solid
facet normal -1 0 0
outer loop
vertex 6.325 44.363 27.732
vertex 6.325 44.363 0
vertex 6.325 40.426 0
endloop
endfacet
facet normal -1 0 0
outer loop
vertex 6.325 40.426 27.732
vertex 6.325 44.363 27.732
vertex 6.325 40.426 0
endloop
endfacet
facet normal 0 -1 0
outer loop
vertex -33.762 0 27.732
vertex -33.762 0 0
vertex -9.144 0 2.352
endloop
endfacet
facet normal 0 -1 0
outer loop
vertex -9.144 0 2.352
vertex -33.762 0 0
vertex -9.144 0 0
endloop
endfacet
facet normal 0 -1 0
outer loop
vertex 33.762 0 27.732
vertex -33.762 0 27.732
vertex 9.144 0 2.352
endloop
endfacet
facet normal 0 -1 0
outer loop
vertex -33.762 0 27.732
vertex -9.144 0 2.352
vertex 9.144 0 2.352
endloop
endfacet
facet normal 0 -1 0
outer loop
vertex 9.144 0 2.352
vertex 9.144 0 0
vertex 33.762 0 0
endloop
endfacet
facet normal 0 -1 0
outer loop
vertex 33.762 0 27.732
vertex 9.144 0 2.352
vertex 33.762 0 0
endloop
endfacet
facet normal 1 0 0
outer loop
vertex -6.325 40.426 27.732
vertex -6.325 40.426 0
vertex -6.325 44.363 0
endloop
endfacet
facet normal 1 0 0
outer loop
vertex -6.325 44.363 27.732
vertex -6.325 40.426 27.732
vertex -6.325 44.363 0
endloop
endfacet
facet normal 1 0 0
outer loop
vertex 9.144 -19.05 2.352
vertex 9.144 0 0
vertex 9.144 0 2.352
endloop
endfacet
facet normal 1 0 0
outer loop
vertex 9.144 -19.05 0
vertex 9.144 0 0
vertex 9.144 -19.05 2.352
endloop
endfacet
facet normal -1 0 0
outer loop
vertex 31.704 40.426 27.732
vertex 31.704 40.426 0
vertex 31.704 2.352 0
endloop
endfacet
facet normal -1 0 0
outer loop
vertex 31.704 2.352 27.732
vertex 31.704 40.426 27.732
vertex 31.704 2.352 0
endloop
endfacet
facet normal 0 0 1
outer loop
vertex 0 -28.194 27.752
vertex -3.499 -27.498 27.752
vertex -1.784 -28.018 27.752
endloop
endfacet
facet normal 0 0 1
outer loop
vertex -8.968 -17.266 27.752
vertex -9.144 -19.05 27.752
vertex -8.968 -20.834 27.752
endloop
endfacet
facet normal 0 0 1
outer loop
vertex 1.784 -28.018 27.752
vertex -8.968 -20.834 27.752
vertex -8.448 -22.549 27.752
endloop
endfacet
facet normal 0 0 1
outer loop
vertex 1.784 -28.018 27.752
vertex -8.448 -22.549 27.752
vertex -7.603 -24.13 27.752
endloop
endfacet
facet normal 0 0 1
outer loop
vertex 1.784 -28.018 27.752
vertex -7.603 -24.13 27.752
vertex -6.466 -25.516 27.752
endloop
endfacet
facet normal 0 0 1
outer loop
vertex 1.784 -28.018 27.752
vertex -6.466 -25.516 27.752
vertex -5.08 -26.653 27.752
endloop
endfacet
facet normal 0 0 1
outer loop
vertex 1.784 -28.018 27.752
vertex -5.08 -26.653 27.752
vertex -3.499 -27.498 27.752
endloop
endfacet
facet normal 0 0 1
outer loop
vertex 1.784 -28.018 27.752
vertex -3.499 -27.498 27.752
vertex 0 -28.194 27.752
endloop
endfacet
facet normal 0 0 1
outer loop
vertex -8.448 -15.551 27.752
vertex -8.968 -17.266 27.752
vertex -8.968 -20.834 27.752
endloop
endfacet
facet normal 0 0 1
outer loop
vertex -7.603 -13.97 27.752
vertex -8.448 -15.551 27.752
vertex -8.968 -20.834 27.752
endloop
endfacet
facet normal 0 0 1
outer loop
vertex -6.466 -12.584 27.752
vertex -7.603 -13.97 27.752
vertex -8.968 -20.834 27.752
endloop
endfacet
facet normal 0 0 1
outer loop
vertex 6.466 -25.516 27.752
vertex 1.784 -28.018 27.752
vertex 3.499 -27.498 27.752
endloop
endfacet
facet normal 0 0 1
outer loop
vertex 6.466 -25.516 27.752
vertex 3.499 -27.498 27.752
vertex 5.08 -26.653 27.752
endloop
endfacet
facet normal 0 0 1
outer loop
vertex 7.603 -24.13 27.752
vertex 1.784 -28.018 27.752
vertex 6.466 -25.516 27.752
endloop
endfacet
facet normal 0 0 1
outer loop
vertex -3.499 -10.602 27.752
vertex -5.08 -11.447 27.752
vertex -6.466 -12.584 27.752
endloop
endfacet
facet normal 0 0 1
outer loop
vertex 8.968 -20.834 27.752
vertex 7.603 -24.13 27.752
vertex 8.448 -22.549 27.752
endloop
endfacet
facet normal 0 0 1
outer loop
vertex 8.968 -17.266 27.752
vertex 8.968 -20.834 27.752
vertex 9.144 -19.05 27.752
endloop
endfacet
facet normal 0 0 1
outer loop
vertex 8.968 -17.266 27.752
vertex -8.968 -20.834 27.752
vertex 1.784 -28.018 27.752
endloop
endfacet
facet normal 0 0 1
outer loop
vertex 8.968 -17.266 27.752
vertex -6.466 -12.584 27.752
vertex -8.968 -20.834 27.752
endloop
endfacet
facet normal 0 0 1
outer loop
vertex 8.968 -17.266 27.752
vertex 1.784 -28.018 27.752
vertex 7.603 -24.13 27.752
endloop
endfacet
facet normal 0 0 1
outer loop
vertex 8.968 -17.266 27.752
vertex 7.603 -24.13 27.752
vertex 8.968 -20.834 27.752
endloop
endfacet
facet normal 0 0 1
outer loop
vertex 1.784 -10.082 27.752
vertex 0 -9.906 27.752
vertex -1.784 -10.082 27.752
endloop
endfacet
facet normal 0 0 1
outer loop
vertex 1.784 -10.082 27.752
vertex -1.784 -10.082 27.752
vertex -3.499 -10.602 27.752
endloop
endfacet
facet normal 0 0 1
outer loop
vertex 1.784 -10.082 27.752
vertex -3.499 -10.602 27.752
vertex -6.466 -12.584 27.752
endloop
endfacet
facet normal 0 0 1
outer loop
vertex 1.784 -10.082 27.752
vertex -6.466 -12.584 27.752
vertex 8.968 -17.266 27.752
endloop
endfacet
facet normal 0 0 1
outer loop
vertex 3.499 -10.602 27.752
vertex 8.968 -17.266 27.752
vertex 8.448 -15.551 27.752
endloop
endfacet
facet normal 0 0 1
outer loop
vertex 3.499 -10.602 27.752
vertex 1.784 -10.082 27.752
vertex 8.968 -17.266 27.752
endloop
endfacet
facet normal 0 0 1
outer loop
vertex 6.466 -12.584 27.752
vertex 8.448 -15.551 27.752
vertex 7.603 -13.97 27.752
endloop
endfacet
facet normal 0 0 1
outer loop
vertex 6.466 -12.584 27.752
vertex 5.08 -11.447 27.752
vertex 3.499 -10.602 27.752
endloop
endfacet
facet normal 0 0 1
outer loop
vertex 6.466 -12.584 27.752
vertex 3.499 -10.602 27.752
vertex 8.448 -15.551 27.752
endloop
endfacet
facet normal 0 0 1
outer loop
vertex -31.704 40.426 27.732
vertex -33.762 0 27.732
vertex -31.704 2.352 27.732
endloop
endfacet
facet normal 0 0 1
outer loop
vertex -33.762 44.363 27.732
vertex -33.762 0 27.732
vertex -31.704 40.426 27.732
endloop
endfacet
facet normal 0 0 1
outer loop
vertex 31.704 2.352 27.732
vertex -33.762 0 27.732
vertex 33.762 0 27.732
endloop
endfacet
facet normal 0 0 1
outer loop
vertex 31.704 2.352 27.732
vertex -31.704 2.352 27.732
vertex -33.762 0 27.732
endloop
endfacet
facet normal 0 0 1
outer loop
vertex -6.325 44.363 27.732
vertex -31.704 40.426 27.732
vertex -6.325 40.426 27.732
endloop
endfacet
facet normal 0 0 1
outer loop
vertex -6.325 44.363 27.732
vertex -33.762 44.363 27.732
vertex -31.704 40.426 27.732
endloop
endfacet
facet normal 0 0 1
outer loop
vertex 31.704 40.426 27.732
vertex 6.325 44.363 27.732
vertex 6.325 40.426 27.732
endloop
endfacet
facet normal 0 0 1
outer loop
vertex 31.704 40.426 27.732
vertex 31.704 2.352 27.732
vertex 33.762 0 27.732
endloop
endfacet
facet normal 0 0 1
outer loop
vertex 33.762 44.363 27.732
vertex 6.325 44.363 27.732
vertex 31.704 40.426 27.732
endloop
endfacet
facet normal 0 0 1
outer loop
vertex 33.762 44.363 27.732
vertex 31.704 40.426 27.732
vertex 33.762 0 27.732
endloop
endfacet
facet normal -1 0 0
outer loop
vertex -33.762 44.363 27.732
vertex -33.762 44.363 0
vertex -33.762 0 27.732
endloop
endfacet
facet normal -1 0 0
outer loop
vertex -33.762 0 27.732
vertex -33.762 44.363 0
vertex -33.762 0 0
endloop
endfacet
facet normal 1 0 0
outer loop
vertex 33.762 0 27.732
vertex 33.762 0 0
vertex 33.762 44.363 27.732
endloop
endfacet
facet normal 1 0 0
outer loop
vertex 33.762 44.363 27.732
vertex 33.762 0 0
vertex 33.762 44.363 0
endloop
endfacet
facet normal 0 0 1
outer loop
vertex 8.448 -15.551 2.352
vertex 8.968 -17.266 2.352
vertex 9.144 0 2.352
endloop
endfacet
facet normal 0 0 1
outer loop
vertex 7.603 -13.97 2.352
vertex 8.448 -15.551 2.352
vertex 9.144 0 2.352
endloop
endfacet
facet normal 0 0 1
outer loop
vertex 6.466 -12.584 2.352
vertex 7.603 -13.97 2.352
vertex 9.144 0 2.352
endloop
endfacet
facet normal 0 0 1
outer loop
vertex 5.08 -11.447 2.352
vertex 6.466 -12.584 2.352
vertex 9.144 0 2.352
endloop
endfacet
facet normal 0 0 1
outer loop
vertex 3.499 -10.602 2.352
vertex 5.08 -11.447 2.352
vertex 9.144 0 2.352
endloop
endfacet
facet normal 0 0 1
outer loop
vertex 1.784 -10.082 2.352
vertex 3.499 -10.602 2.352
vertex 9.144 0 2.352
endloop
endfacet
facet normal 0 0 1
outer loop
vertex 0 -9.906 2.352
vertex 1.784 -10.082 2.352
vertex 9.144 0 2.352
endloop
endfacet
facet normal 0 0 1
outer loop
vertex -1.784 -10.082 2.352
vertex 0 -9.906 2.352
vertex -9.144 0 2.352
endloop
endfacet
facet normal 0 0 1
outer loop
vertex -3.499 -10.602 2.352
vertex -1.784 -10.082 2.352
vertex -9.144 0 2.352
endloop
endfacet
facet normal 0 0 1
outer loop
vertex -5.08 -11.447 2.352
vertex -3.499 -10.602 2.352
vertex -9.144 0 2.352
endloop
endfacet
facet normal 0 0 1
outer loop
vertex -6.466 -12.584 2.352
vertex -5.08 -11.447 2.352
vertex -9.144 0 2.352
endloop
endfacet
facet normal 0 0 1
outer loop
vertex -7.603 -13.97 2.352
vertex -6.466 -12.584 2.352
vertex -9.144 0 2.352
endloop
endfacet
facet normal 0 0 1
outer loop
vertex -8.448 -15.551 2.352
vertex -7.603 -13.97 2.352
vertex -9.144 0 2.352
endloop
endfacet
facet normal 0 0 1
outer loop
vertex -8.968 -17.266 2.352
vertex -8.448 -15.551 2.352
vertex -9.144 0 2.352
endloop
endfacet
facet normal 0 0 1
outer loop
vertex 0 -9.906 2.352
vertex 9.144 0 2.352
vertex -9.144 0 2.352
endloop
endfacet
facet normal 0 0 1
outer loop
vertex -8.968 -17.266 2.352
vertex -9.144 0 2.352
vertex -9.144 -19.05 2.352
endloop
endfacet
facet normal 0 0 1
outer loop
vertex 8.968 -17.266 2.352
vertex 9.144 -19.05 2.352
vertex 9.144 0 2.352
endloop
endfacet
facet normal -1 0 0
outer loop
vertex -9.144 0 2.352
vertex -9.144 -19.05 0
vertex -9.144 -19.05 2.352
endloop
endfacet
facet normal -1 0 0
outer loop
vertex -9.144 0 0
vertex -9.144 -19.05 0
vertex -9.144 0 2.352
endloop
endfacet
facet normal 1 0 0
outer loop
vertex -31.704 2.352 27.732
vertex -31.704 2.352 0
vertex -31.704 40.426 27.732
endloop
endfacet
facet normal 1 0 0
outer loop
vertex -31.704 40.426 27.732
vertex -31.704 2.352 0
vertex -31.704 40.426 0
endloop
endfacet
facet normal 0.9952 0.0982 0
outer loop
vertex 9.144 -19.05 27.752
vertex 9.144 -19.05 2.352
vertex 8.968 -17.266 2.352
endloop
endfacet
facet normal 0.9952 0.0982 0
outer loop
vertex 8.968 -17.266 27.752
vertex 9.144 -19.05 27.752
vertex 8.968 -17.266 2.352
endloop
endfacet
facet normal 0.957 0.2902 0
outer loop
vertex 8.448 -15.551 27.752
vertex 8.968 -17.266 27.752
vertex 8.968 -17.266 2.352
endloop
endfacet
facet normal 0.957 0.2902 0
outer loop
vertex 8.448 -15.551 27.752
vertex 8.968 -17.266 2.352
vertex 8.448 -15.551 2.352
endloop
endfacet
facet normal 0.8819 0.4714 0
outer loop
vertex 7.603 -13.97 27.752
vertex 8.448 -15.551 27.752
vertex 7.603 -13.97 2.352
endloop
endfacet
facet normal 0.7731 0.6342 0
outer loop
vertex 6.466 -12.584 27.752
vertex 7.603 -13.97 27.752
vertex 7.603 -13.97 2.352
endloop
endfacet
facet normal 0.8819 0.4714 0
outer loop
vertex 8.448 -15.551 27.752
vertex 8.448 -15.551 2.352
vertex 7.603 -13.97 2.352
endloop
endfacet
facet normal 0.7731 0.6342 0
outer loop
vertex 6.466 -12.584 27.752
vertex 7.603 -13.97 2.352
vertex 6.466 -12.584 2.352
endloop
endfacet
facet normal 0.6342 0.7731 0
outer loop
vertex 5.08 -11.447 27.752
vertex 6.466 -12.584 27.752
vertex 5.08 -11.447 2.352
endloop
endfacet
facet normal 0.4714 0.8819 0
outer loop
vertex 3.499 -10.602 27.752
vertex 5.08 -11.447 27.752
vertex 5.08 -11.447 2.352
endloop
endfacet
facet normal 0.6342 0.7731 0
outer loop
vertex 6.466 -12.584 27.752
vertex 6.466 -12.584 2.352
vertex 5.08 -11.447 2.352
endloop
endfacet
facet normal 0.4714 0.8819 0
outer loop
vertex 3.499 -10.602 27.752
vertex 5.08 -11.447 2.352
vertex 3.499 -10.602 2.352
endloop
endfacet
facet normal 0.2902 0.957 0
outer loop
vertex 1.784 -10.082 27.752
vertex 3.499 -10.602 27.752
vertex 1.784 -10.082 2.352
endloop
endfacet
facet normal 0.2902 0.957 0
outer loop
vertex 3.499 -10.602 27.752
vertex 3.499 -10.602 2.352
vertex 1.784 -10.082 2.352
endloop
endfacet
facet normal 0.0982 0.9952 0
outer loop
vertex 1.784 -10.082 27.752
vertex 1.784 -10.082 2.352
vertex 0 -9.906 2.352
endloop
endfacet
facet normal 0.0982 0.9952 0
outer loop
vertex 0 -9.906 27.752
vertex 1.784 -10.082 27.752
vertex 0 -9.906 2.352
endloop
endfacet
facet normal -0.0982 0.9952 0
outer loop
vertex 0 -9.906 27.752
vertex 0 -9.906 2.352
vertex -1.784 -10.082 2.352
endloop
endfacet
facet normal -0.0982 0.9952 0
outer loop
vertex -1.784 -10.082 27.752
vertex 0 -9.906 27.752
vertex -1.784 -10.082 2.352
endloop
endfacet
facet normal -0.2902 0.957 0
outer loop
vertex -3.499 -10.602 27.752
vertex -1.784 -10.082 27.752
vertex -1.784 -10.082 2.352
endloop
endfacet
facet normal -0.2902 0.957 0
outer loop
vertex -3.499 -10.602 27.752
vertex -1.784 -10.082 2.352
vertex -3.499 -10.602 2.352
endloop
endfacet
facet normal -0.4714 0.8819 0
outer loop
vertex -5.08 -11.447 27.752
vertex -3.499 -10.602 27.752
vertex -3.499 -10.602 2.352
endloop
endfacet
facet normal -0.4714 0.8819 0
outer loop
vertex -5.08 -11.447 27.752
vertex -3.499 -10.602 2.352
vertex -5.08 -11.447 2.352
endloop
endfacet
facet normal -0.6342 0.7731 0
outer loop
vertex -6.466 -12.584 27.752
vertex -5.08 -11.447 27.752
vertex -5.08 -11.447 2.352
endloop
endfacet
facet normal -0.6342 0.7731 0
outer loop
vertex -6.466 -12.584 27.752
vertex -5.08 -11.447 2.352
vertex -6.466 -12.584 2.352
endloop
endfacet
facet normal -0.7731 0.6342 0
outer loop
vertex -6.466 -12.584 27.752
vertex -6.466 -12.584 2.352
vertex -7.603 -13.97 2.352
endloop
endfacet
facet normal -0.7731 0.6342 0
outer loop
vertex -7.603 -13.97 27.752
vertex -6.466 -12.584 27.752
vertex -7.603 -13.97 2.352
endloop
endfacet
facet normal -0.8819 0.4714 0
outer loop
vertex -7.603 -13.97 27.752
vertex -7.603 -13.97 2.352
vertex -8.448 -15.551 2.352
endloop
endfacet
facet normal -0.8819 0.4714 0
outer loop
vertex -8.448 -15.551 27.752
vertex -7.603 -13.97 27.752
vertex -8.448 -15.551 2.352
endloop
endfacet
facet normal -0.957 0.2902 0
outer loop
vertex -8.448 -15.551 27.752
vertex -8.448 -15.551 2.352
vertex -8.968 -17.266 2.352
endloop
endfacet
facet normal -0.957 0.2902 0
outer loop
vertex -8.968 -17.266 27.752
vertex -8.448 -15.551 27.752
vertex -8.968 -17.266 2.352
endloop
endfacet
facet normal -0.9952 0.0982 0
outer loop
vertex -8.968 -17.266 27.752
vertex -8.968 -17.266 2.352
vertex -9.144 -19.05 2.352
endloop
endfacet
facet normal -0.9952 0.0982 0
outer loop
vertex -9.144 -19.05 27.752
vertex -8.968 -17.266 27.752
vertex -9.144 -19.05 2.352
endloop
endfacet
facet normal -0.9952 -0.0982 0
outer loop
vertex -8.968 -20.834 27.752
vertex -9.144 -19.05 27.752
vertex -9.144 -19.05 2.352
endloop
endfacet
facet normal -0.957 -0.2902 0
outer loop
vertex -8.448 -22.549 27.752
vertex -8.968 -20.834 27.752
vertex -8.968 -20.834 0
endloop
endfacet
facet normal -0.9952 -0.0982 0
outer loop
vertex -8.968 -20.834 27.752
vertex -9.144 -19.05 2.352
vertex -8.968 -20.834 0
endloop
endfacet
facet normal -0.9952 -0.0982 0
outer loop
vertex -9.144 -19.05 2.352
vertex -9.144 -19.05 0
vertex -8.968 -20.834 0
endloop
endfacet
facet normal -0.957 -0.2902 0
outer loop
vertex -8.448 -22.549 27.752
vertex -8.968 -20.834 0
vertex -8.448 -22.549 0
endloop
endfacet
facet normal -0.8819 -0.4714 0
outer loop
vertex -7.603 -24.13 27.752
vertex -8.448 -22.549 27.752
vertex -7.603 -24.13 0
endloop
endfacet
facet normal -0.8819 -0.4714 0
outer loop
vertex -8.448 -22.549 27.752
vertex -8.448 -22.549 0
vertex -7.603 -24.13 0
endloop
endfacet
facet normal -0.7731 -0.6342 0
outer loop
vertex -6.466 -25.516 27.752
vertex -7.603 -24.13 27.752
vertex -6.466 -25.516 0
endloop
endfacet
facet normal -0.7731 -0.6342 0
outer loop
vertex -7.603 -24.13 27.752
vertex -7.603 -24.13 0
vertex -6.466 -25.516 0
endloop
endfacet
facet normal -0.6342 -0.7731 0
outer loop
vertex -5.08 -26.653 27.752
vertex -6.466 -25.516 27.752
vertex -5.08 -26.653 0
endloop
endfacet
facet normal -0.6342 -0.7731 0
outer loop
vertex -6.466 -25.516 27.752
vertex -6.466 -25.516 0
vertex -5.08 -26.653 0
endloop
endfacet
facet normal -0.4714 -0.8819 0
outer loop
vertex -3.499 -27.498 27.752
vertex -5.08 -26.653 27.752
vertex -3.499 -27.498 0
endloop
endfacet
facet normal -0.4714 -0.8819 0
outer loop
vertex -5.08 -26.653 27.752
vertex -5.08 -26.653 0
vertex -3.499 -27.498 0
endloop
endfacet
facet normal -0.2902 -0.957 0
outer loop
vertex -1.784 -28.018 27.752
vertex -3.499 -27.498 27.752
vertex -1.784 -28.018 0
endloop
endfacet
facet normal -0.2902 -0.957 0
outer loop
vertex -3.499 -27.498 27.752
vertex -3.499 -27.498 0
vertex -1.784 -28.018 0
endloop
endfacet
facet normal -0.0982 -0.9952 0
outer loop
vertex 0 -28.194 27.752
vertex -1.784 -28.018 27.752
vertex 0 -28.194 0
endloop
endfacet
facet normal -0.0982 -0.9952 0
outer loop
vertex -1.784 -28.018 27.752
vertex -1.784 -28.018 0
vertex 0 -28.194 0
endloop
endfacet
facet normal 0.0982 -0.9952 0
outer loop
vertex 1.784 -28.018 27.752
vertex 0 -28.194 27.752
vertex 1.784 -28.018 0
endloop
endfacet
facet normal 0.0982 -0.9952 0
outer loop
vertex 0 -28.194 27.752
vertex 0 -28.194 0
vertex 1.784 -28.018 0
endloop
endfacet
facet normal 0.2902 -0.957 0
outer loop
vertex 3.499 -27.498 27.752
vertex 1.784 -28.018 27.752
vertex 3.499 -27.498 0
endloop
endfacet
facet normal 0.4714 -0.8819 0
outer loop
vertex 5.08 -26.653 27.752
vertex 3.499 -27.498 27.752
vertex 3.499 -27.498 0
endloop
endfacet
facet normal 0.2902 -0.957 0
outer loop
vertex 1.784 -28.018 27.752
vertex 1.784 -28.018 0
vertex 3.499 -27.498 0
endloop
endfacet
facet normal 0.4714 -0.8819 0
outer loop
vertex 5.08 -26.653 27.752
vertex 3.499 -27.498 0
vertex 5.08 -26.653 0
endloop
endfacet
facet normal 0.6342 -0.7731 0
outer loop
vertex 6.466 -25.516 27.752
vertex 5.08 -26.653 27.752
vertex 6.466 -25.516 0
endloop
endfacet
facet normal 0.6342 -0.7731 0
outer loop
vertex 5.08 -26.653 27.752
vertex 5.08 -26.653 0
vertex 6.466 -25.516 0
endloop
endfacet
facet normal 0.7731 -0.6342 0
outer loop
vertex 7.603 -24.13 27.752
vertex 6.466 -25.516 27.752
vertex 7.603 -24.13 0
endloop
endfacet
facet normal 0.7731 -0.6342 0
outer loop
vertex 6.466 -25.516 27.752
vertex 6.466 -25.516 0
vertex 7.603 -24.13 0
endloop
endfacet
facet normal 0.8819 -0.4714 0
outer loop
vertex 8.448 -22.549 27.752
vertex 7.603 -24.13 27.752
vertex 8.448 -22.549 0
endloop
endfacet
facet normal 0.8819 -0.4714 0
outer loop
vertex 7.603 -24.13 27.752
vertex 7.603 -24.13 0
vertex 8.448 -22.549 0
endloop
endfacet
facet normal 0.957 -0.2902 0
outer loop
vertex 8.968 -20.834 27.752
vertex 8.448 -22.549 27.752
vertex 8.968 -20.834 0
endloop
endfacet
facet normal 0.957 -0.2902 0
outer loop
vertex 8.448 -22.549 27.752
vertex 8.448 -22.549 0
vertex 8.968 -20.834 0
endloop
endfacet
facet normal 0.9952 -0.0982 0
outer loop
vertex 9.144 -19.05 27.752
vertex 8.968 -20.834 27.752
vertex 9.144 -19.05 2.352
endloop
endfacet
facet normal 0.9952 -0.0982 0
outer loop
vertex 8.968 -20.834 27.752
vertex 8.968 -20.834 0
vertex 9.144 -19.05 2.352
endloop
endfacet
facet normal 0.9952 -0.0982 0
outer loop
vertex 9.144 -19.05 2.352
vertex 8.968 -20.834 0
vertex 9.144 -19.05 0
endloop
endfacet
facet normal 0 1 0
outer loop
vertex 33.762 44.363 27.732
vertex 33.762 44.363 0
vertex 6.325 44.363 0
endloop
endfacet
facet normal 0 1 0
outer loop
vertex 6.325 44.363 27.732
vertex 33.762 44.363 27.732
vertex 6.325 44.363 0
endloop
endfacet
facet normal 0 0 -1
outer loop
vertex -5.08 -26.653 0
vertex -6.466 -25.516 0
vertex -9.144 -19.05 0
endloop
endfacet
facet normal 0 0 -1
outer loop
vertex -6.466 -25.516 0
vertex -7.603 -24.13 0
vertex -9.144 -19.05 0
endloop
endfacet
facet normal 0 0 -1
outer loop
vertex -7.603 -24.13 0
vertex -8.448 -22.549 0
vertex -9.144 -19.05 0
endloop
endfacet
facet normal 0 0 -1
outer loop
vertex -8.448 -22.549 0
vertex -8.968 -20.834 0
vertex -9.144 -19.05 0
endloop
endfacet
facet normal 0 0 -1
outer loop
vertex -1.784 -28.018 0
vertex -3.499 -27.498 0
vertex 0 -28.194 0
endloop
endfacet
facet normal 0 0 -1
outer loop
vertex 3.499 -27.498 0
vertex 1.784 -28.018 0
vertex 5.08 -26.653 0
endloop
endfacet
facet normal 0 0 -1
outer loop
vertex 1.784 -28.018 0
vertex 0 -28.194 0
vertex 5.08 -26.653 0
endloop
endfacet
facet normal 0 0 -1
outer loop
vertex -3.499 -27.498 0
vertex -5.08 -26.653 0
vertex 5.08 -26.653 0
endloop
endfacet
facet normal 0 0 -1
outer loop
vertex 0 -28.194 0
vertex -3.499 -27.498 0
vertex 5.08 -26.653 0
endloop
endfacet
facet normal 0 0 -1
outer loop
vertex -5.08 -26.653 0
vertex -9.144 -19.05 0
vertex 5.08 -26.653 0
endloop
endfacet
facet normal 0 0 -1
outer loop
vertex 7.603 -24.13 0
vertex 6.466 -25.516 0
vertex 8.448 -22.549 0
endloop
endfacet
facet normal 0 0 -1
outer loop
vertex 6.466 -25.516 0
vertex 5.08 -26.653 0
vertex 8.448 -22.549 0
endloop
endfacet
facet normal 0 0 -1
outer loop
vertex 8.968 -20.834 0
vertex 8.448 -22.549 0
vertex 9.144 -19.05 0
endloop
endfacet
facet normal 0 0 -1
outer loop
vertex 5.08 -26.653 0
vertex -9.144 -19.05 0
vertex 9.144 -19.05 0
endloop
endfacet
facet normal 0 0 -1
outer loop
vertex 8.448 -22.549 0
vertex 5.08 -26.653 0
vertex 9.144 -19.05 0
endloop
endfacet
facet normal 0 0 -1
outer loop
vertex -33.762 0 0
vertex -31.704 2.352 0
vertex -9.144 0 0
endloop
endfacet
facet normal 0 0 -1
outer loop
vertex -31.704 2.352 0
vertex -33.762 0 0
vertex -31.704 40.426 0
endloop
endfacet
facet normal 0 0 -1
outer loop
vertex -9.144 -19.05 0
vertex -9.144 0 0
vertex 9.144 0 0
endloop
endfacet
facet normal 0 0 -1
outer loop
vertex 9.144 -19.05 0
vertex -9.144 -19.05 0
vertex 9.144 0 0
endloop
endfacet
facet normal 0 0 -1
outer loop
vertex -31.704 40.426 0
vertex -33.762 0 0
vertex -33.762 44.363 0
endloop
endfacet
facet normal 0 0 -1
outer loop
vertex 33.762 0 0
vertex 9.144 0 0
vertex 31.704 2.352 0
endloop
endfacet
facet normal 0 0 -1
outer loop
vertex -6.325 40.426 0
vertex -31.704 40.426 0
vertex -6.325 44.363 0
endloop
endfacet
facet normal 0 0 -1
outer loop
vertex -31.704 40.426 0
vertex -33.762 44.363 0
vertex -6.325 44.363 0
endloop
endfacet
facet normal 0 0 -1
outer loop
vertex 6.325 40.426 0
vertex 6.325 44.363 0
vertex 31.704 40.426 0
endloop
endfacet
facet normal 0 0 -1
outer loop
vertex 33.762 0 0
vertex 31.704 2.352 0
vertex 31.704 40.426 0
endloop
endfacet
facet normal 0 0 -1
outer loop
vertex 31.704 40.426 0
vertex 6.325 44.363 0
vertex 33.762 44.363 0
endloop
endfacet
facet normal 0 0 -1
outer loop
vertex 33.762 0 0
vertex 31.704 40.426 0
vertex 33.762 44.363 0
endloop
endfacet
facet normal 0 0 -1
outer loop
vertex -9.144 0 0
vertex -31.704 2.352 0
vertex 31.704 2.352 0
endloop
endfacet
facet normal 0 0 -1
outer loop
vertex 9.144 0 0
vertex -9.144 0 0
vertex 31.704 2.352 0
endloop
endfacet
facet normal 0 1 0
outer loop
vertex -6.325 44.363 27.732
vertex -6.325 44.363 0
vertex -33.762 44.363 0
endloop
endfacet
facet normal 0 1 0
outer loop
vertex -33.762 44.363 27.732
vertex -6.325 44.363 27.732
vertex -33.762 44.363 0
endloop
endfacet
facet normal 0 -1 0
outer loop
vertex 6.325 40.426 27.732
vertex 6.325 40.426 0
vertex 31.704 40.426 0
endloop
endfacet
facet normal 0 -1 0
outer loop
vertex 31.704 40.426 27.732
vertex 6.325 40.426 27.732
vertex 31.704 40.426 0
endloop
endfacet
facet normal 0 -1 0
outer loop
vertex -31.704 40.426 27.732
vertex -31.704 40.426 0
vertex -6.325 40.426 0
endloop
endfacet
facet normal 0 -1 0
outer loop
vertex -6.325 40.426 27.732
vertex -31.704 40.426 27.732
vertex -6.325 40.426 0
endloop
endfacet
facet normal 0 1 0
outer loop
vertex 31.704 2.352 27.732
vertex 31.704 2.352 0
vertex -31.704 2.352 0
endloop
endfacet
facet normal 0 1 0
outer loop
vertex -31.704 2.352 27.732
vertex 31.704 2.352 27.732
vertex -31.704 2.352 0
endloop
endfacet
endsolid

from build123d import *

# Parameters (mm, degrees)
BOSS_EXTRUDE1_DEPTH = 27.731531852
BOSS_EXTRUDE2_DEPTH = 2.351851852
SKETCH4_R           = 9.144
BOSS_EXTRUDE3_DEPTH = 25.4


with BuildPart() as part:
    # Sketch1 → Boss-Extrude1 (new body)
    with BuildSketch(Plane.XY):
        Polygon((-33.76168, 0), (33.76168, 0), (33.76168, 44.363451852), (6.3246, 44.363451852), (6.3246, 40.426451852), (31.70428, 40.426451852), (31.70428, 2.351851852), (-31.70428, 2.351851852), (-31.70428, 40.426451852), (-6.3246, 40.426451852), (-6.3246, 44.363451852), (-33.76168, 44.363451852), align=None)
    extrude(amount=BOSS_EXTRUDE1_DEPTH)

    # Sketch2 → Boss-Extrude2 (add)
    with BuildSketch(Plane.XY):
        with BuildLine():
            Line((-9.144, 0), (9.144, 0))
            Line((9.144, 0), (9.144, -19.05))
            ThreePointArc((9.144, -19.05), (0, -28.194), (-9.144, -19.05))
            Line((-9.144, -19.05), (-9.144, 0))
        make_face()
    extrude(amount=BOSS_EXTRUDE2_DEPTH)

    # Sketch4 → Boss-Extrude3 (add)
    with BuildSketch(Plane.XY.offset(2.351851852)):
        with Locations((0, -19.05)):
            Circle(SKETCH4_R)
    extrude(amount=BOSS_EXTRUDE3_DEPTH)


solid = part.part
